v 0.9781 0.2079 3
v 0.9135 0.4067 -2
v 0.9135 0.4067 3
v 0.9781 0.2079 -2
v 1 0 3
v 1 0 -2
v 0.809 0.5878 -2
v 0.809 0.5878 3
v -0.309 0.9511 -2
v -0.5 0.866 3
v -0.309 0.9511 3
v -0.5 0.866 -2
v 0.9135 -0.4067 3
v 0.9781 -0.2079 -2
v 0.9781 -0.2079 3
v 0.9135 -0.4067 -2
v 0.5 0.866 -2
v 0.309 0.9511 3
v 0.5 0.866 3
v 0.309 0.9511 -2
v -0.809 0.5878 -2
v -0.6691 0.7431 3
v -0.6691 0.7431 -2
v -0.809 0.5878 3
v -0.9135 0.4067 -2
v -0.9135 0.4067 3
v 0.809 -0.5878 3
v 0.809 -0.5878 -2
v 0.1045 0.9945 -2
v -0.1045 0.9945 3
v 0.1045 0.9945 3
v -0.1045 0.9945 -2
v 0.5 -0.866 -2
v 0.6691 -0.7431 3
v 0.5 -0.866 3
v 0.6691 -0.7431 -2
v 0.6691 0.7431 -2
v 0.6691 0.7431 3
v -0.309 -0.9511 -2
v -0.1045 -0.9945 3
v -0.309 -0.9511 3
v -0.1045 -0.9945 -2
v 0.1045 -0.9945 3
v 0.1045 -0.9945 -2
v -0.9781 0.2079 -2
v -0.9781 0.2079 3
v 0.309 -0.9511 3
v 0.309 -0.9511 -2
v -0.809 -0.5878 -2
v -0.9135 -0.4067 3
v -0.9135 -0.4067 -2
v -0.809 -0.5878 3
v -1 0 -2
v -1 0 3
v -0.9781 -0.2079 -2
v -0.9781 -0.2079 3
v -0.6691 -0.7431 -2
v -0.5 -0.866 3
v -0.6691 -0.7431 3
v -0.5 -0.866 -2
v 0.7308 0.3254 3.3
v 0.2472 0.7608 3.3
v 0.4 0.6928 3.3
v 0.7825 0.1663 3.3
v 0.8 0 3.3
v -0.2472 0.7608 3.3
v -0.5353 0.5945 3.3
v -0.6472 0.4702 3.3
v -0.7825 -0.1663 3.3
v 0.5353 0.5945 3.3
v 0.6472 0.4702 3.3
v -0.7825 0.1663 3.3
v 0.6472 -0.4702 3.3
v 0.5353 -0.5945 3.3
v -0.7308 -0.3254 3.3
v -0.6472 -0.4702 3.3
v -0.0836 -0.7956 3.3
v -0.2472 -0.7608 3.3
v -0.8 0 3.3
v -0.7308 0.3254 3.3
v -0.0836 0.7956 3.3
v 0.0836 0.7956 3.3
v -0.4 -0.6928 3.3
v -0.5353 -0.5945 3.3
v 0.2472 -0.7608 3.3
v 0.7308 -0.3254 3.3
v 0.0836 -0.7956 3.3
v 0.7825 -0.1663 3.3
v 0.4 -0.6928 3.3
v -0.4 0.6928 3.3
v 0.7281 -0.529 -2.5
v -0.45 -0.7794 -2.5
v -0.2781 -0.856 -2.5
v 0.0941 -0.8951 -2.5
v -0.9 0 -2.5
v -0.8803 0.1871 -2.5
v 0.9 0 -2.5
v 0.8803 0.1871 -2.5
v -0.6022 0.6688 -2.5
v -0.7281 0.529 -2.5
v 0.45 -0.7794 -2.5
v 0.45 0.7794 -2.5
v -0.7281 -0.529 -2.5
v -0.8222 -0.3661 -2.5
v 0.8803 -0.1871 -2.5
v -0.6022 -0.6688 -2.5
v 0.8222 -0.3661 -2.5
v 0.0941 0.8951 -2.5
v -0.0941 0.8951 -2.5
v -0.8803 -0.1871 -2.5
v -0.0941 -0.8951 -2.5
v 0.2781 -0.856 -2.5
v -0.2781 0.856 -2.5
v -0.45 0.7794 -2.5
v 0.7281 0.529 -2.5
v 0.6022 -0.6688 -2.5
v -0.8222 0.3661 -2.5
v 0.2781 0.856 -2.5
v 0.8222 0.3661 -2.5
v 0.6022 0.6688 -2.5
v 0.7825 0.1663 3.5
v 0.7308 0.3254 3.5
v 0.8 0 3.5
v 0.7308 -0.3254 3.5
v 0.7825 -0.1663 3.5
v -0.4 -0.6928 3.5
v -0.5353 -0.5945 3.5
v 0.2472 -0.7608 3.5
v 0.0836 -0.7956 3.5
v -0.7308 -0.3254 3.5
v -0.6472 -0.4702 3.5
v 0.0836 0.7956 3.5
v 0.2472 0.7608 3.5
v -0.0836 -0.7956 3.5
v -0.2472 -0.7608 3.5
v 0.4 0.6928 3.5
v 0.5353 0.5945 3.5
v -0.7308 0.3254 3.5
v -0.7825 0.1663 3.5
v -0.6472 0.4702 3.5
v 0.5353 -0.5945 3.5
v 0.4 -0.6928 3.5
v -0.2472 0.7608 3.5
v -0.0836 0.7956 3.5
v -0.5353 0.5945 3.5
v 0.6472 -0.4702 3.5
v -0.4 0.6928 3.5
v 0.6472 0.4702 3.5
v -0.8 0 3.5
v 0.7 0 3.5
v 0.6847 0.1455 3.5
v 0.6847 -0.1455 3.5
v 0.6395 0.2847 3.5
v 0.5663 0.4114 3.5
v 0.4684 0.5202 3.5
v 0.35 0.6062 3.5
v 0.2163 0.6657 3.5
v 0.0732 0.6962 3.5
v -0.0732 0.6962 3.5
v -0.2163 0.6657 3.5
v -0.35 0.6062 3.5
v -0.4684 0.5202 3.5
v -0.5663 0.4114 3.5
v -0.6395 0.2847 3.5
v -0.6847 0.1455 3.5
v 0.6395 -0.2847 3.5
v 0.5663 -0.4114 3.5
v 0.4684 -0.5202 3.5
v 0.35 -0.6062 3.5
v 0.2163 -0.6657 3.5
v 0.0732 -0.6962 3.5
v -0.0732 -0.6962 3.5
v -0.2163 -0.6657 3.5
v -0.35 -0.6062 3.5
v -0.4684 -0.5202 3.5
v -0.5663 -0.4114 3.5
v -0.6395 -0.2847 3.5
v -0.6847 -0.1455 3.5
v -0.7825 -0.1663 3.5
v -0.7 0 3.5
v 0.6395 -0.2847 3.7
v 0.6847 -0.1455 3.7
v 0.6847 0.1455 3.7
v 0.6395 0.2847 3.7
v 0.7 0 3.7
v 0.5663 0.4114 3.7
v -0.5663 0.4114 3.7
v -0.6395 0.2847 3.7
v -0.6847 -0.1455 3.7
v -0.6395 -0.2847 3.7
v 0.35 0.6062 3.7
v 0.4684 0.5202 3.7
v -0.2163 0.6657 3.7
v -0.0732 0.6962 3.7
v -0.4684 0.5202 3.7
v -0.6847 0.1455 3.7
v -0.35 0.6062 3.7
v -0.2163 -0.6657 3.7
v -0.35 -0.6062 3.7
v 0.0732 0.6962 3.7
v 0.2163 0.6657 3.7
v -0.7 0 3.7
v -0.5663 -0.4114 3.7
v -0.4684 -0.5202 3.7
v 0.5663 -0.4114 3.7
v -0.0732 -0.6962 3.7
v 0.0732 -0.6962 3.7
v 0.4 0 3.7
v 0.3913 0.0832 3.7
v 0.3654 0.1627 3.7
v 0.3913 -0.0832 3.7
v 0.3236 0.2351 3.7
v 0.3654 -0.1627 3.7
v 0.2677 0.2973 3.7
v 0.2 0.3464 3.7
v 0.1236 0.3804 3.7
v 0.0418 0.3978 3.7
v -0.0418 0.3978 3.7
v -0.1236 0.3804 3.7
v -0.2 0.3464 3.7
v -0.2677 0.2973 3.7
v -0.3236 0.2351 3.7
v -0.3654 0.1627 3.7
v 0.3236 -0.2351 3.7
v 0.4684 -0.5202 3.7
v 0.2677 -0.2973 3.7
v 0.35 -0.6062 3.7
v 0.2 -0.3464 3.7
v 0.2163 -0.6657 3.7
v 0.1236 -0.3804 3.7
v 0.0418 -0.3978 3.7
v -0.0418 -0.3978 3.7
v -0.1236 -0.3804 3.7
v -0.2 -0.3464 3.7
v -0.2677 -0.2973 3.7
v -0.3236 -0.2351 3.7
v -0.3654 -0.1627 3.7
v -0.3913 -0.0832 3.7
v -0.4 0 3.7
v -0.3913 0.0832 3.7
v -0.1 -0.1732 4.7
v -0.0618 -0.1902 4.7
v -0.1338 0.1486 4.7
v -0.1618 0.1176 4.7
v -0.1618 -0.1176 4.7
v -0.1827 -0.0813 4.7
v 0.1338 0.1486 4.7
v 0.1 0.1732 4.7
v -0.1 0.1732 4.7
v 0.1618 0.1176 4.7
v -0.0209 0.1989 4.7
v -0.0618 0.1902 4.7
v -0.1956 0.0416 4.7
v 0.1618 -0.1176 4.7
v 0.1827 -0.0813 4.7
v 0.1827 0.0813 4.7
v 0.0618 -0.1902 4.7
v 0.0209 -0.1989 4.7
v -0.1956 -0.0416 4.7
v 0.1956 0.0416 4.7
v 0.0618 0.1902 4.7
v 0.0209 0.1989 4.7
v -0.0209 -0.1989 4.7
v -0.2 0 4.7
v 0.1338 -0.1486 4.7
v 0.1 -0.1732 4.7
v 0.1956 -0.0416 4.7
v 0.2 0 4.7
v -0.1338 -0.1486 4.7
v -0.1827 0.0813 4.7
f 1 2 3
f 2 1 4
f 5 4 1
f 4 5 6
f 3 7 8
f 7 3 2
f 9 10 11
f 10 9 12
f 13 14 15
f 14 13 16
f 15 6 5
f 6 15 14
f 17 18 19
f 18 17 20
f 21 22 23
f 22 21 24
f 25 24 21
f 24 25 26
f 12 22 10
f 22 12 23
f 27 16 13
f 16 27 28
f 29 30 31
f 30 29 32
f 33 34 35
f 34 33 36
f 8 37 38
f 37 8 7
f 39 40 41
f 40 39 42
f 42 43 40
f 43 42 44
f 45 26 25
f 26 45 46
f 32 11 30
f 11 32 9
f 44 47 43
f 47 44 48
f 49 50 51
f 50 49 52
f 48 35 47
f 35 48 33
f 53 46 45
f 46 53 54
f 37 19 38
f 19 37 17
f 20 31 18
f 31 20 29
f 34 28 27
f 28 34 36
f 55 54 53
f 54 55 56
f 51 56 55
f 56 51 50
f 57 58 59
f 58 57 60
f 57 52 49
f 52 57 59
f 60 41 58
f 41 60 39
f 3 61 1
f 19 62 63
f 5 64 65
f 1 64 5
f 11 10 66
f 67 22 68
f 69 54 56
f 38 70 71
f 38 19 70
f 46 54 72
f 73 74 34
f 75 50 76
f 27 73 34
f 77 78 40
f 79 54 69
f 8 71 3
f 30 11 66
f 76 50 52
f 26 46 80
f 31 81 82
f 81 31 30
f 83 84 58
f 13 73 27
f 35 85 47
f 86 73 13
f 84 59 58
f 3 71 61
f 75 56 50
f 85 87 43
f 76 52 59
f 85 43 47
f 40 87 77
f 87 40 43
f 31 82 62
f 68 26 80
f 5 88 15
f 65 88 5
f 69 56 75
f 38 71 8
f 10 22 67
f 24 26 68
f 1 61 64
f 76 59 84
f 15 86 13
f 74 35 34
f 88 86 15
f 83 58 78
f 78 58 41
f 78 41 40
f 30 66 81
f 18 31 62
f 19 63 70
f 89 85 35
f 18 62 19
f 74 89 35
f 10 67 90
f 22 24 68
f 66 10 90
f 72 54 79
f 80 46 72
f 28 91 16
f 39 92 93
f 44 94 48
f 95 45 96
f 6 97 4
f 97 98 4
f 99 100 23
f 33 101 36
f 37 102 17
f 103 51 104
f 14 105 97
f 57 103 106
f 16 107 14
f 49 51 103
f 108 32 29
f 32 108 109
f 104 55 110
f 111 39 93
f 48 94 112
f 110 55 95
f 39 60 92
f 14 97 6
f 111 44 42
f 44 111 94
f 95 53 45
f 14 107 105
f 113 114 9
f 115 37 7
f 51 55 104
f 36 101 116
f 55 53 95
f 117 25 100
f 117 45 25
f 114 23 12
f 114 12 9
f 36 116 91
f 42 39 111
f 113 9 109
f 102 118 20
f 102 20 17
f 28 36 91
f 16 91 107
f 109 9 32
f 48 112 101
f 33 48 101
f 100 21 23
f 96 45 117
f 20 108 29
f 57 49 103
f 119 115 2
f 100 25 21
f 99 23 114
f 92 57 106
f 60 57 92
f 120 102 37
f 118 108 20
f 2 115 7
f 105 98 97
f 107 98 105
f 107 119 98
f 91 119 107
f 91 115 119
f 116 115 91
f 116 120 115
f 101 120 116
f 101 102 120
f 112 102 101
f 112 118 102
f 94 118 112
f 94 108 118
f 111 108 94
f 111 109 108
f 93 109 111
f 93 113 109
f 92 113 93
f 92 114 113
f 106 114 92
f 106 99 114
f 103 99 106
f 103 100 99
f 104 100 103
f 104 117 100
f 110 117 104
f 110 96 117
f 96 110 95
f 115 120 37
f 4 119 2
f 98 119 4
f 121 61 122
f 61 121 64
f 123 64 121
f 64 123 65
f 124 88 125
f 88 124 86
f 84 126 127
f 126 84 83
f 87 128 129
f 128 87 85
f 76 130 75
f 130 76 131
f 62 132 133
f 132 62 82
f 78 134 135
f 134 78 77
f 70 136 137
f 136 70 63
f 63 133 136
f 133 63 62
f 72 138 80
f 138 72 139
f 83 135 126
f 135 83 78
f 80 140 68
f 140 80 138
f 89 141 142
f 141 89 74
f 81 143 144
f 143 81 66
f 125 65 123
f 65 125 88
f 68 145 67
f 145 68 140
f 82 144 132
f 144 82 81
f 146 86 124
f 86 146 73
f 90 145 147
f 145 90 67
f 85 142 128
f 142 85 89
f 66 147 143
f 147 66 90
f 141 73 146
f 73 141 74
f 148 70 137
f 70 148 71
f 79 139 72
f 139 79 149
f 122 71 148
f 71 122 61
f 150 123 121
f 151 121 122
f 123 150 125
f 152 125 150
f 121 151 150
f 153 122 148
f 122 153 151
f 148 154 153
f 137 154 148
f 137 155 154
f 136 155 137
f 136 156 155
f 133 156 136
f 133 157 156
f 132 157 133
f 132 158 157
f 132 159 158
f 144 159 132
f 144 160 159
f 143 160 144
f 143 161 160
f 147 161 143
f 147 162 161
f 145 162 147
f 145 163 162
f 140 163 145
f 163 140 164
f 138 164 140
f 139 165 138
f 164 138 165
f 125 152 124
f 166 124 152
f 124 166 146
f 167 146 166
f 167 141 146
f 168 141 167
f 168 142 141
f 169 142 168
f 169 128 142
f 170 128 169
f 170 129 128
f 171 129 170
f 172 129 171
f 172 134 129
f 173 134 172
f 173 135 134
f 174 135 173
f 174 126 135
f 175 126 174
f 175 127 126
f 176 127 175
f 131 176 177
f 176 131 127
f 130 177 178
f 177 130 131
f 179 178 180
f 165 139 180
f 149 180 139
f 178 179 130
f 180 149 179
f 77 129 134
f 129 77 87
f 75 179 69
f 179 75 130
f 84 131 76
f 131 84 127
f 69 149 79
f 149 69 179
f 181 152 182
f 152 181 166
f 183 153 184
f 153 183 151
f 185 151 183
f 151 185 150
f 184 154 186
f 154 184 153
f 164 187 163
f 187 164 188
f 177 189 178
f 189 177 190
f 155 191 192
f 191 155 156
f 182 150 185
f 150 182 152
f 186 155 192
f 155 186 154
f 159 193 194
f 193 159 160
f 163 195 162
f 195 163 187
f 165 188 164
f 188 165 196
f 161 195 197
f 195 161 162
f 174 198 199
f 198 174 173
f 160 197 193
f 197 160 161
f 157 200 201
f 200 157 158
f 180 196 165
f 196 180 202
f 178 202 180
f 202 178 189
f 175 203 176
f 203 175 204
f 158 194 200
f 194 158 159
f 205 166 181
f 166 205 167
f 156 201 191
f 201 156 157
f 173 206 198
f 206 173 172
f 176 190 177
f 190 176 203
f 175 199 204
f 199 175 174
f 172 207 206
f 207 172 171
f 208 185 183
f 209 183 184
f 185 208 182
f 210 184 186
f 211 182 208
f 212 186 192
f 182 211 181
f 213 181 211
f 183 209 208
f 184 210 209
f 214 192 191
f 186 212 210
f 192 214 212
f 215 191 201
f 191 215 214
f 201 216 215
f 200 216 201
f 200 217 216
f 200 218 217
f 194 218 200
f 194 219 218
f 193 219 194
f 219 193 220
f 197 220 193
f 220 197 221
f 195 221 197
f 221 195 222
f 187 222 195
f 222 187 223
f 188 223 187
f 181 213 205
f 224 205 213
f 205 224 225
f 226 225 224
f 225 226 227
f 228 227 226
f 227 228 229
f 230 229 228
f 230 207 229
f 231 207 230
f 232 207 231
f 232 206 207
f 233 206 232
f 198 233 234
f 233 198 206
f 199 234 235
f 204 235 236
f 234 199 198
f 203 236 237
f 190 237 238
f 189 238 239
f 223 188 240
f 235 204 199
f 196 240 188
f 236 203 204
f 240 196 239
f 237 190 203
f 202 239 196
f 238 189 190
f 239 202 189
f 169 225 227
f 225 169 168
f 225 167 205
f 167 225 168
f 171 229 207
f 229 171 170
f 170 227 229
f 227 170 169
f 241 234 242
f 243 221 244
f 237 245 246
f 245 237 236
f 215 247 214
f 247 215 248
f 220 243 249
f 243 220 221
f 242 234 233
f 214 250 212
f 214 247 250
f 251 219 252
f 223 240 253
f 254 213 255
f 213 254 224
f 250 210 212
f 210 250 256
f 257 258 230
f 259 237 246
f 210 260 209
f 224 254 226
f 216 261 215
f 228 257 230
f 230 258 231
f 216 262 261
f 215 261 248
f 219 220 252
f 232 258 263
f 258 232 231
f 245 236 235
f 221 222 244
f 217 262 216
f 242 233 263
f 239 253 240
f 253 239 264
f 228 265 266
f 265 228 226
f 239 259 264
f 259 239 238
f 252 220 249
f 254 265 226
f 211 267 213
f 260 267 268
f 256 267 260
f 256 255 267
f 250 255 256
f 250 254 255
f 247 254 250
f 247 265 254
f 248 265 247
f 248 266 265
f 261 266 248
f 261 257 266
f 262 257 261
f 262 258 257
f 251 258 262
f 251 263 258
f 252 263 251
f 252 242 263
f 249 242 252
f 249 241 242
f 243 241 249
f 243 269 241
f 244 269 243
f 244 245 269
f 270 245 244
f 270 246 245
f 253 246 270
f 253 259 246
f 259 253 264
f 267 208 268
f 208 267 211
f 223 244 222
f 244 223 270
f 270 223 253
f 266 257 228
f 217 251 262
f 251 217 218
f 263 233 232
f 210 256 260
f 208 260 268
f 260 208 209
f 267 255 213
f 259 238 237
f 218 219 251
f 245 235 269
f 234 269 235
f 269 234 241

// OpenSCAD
module Sauce_Bottle(Mat = 0){

    Ketchup = "#ec0606"; 
    Mayonnaise = "#ffffee";
    Mustard = "#e5c54f";

    Material = [Ketchup,Mayonnaise,Mustard];

    color(Material[Mat]){
    translate([0,0,0.5])
    cylinder(5, 1,1, $fn = 30, center = true);

    translate([0,0,3])
    cylinder(0.3, 1,0.8, $fn = 30);

    translate([0,0,-2.5])
    cylinder(0.5,0.9,1, $fn = 30);
    }

    color("#f9f2f2"){
    translate([0,0,3.3])
    cylinder(0.2, 0.8,0.8, $fn = 30);
    }

    color("#f9f2f2"){
    translate([0,0,3.5])
    cylinder(0.2, 0.7,0.7, $fn = 30);
    }

    color("#f9f2f2"){
    translate([0,0,3.7])
    cylinder(1, 0.4,0.2, $fn = 30);
    }

}

Sauce_Bottle(2);

// Written by Nicolì Angelo (Gengio) 2024: 
// MIT License

//Permission is hereby granted, free of charge, to any person obtaining a copy of this software and associated documentation files (the "Software"), to deal in the Software without restriction, including without limitation the rights to use, copy, modify, merge, publish, distribute, sublicense, and/or sell copies of the Software, and to permit persons to whom the Software is furnished to do so, subject to the following conditions:

//The above copyright notice and this permission notice shall be included in all copies or substantial portions of the Software.

//THE SOFTWARE IS PROVIDED "AS IS", WITHOUT WARRANTY OF ANY KIND, EXPRESS OR IMPLIED, INCLUDING BUT NOT LIMITED TO THE WARRANTIES OF MERCHANTABILITY, FITNESS FOR A PARTICULAR PURPOSE AND NONINFRINGEMENT. IN NO EVENT SHALL THE AUTHORS OR COPYRIGHT HOLDERS BE LIABLE FOR ANY CLAIM, DAMAGES OR OTHER LIABILITY, WHETHER IN AN ACTION OF CONTRACT, TORT OR OTHERWISE, ARISING FROM, OUT OF OR IN CONNECTION WITH THE SOFTWARE OR THE USE OR OTHER DEALINGS IN THE SOFTWARE.
